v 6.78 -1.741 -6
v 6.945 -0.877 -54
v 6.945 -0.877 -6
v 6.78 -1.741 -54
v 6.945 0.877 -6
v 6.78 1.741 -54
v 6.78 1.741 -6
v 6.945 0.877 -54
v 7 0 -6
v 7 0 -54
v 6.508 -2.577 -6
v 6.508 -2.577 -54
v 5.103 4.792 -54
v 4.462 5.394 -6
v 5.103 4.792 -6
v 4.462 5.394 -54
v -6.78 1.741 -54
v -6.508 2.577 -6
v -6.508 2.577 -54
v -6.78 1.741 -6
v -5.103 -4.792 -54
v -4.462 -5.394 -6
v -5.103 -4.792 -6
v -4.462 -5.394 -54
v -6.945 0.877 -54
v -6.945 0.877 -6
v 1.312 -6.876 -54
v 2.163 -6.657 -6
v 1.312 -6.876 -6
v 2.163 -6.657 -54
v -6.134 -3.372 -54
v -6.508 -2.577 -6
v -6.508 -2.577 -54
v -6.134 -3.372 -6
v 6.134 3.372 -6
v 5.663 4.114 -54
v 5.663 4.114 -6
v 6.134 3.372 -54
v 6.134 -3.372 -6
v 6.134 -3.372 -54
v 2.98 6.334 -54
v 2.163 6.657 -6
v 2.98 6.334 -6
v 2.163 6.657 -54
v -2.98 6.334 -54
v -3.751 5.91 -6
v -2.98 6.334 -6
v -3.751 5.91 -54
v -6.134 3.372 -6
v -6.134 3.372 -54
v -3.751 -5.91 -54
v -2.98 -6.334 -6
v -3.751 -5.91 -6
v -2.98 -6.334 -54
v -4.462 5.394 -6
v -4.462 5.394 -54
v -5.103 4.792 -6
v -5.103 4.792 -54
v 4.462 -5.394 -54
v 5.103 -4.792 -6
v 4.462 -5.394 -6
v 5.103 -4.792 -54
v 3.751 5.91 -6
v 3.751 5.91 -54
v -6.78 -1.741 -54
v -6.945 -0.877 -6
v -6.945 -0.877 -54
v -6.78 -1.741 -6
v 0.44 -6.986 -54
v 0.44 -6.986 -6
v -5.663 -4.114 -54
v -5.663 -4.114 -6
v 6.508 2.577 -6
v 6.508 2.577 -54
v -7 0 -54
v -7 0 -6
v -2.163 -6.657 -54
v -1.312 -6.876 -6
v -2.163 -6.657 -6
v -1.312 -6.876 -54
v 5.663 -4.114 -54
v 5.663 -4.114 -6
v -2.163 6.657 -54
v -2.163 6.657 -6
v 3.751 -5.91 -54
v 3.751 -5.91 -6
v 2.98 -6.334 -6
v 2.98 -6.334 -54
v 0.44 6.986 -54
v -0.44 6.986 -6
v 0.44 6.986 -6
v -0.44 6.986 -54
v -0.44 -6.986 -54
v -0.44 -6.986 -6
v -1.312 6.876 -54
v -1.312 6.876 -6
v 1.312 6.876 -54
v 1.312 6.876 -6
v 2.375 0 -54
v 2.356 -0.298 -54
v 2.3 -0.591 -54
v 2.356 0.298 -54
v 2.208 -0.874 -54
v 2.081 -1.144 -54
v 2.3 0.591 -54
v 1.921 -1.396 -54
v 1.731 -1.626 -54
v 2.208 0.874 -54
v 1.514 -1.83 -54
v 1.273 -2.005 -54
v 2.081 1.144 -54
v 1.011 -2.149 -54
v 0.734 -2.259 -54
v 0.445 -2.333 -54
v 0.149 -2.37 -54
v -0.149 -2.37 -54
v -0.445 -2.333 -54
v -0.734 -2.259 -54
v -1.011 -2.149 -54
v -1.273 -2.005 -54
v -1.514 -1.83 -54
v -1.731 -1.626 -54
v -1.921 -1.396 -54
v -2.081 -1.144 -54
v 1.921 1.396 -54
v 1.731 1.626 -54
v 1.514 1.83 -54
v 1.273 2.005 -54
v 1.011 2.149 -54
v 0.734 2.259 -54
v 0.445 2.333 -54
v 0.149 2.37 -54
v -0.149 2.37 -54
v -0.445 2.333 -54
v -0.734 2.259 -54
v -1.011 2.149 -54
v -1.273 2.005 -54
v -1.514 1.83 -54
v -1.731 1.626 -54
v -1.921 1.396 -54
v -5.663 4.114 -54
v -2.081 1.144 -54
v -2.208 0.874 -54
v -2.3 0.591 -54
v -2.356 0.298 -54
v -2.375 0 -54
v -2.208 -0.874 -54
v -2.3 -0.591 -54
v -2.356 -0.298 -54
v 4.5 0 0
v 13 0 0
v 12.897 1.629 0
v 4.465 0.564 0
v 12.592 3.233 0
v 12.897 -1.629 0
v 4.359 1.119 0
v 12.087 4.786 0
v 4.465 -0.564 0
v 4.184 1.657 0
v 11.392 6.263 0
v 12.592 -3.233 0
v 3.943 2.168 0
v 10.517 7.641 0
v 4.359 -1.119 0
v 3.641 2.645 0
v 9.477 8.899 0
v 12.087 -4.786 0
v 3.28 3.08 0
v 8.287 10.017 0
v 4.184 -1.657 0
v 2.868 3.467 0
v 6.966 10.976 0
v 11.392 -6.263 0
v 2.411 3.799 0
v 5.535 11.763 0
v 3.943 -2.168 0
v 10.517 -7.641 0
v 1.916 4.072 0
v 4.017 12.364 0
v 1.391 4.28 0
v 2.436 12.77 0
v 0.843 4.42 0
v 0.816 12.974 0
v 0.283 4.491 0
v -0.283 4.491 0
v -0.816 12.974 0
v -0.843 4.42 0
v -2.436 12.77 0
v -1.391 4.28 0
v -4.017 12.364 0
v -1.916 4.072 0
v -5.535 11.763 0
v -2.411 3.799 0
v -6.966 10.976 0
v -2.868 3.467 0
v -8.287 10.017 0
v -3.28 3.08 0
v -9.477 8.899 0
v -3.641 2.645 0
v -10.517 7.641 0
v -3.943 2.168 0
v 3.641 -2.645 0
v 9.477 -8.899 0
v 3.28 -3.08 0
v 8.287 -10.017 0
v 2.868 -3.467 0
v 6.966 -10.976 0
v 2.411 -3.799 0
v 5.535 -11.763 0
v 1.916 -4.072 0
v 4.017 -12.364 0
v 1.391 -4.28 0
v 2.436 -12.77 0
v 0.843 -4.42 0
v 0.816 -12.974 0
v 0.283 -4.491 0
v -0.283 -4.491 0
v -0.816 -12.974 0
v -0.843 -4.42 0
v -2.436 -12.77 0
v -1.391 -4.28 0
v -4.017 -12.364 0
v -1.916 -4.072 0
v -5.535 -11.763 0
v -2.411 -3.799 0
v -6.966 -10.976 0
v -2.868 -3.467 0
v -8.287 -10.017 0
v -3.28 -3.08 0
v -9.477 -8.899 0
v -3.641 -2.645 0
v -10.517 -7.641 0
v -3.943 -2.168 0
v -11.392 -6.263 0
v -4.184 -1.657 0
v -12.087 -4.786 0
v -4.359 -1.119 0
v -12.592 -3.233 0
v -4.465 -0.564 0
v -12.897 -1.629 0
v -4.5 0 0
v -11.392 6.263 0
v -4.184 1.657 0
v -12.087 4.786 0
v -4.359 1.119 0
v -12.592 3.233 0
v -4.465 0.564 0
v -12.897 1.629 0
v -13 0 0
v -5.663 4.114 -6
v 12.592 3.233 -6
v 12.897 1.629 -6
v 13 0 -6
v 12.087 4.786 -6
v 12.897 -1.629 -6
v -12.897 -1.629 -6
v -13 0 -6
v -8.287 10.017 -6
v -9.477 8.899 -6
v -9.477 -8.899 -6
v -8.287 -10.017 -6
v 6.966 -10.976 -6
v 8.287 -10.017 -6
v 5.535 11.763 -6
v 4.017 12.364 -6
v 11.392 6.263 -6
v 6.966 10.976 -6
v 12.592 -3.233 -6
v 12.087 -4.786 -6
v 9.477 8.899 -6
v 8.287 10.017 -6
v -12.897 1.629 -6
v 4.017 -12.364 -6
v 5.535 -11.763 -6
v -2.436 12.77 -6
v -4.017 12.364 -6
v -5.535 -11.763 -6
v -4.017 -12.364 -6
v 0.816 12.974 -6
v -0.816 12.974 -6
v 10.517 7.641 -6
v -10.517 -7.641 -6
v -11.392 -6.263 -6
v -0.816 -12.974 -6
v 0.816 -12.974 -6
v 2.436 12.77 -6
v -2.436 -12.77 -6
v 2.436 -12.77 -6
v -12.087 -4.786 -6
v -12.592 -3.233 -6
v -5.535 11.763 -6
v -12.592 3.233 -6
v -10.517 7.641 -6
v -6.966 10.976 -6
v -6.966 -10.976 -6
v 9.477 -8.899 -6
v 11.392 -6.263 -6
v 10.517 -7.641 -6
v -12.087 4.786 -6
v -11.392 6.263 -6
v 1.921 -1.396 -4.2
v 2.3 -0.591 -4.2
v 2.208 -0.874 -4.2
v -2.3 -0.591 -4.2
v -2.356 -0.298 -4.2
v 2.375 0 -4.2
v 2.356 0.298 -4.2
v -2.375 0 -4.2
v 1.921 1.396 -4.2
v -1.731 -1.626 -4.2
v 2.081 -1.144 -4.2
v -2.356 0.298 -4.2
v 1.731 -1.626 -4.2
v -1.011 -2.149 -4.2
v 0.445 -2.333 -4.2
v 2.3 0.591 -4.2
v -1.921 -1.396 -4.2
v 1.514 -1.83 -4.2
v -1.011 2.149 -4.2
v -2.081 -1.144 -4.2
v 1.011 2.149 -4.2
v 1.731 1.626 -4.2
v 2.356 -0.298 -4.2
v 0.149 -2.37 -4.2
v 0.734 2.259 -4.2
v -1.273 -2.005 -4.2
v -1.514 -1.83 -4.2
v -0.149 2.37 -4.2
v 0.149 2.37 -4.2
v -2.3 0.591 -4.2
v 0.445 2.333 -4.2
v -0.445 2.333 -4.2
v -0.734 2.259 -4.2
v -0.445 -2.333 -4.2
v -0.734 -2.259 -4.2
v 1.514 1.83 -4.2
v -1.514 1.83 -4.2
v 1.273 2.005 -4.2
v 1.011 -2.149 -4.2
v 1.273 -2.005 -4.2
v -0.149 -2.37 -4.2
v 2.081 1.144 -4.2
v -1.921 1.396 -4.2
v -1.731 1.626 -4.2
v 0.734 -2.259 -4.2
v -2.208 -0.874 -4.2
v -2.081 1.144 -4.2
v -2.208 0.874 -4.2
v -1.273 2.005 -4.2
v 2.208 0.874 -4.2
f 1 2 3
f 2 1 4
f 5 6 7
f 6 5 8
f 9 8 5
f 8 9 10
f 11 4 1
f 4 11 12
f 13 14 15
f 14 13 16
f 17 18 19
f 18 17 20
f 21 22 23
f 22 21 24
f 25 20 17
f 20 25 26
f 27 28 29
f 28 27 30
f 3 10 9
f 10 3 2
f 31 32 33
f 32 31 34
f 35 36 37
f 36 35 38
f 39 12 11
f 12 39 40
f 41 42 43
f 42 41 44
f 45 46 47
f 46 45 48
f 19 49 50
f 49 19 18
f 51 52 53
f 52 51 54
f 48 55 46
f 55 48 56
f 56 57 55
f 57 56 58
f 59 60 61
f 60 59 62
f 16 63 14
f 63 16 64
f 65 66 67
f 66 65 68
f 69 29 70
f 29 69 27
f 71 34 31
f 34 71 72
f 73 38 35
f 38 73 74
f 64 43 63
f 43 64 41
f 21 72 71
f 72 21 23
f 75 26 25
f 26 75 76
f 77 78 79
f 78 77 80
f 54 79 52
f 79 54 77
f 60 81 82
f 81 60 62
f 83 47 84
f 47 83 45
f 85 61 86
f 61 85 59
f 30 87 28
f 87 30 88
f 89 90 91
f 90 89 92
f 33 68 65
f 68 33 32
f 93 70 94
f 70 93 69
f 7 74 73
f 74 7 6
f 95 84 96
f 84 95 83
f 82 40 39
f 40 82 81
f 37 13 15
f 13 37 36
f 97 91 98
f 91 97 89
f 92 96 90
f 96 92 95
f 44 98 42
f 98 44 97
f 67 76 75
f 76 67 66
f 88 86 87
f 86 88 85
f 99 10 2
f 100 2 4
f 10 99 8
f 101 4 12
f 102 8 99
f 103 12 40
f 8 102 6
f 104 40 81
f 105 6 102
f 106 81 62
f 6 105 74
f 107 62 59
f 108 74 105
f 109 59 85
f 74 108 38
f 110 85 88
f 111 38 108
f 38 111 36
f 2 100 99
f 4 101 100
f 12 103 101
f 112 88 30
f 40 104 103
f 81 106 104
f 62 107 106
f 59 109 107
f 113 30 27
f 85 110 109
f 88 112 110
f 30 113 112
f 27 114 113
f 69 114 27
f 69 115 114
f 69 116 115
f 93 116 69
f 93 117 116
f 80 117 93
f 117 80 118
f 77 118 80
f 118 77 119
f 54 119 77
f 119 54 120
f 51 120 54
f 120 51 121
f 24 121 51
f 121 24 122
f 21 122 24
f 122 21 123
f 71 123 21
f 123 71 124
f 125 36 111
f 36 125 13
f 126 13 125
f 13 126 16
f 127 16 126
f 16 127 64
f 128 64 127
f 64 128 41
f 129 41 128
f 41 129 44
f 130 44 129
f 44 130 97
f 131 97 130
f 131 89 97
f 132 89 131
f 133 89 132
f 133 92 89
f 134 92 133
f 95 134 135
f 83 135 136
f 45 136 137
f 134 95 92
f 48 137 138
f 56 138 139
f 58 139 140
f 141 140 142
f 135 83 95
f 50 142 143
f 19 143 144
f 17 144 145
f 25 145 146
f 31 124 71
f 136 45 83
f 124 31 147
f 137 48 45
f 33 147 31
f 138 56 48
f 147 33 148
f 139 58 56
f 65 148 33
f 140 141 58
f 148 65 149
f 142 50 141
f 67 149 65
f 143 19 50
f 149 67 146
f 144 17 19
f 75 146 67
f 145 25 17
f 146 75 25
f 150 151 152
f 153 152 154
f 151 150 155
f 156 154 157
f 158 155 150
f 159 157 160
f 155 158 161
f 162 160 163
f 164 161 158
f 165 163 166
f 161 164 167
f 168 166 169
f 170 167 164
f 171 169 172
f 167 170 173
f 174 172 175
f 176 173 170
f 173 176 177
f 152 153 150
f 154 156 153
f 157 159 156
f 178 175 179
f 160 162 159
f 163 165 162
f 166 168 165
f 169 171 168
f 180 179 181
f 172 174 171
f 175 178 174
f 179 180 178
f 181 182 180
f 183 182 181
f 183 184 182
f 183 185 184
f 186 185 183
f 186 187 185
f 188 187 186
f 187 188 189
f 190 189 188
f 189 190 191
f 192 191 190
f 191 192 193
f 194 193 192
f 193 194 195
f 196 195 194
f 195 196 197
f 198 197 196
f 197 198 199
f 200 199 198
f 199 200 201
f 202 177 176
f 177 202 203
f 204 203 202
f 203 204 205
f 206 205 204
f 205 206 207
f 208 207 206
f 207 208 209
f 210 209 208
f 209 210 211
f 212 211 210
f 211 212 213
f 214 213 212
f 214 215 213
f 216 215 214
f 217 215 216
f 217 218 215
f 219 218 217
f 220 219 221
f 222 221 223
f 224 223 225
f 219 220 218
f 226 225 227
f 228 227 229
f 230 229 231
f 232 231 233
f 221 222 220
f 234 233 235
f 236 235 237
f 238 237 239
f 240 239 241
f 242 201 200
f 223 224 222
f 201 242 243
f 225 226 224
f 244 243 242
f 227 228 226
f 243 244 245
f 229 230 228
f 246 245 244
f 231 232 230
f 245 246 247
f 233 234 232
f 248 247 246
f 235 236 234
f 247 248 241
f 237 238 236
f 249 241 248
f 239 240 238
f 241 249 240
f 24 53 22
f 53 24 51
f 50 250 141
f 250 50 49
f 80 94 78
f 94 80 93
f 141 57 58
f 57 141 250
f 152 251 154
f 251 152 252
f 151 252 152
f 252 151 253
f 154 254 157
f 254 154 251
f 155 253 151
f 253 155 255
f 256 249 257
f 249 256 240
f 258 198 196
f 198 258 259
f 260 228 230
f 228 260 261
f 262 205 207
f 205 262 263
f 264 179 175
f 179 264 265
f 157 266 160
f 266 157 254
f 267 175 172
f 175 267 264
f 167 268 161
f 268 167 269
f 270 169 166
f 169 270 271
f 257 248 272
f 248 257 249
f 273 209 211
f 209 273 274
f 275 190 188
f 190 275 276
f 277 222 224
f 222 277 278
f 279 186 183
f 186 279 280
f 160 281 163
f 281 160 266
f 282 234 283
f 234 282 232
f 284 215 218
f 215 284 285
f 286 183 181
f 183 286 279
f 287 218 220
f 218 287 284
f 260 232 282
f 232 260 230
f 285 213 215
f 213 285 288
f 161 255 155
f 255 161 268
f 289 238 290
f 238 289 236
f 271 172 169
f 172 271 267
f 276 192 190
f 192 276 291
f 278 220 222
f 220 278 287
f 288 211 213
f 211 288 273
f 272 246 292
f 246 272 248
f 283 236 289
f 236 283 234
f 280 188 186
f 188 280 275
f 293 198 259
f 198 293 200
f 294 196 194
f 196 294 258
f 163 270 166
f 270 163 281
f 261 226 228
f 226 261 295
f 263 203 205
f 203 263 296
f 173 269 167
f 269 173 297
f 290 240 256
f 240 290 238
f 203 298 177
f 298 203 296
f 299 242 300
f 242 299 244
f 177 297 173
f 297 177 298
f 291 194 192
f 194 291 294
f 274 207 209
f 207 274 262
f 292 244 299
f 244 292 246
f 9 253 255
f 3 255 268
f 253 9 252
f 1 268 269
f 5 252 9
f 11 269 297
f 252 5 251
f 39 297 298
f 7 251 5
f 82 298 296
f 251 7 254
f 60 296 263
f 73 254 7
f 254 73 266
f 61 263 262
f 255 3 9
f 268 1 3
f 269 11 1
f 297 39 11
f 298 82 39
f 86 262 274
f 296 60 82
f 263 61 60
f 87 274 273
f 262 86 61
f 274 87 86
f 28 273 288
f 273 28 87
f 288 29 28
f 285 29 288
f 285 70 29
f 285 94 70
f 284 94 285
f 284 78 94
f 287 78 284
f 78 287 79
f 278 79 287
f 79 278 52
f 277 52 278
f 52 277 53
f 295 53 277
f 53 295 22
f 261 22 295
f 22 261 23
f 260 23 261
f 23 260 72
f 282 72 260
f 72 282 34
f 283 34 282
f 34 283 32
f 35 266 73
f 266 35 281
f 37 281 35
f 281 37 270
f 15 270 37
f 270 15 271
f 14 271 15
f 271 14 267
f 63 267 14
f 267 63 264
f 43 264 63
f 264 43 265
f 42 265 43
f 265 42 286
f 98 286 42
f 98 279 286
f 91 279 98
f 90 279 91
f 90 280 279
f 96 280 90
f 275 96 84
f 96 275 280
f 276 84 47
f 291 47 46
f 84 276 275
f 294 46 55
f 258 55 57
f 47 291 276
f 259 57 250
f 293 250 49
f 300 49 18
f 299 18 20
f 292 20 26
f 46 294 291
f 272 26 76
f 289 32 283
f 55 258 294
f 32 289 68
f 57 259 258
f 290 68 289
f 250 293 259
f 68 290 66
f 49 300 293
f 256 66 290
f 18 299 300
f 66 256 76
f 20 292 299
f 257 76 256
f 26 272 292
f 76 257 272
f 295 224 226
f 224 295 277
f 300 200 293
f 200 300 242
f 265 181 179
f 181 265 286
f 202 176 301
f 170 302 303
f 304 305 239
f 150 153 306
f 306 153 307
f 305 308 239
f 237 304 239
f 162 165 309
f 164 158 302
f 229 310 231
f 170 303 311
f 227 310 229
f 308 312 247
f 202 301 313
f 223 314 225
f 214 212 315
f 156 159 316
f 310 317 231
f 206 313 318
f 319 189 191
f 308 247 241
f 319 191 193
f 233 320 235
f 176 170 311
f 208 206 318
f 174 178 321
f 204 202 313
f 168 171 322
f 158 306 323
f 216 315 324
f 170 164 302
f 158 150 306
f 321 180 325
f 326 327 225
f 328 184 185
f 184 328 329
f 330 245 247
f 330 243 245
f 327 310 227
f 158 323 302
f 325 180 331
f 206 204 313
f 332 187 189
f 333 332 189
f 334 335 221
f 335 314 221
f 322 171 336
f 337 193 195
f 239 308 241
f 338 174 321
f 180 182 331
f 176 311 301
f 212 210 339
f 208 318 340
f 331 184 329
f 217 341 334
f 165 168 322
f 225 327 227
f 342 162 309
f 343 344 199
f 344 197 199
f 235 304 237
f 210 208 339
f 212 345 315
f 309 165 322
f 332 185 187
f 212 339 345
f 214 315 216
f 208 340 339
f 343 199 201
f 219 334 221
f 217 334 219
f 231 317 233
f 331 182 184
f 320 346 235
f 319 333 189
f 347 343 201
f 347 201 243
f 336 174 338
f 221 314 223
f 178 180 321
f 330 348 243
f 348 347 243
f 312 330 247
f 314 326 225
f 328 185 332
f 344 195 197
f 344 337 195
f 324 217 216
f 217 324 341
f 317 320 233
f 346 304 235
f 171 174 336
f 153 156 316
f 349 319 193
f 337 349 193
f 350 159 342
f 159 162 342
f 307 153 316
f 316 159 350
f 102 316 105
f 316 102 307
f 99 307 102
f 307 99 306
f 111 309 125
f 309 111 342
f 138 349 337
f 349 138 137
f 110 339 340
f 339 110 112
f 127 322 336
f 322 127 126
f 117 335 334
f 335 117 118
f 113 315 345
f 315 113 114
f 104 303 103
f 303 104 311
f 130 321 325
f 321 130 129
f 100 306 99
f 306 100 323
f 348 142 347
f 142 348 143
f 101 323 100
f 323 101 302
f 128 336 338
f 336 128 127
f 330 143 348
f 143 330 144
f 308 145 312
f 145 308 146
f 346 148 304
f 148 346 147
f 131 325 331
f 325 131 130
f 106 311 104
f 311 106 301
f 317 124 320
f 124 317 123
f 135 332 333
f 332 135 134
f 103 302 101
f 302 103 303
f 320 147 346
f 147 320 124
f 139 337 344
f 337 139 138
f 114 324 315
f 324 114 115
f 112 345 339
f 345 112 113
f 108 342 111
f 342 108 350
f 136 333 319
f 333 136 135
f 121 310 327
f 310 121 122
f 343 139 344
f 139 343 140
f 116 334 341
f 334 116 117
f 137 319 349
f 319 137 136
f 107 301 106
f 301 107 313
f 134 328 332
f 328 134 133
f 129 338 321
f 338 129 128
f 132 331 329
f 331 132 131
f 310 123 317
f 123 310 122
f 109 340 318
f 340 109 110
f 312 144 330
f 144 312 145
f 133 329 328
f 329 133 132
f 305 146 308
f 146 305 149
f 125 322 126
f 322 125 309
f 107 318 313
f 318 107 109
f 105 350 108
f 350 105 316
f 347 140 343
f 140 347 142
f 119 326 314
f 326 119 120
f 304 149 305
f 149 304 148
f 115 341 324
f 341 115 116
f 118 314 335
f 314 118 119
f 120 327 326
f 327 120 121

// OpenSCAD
$fn = 50;


difference() {
	union() {
		translate(v = [0, 0, -54.0000000000]) {
			cylinder(h = 54, r = 7.0000000000);
		}
		translate(v = [0, 0, -6.0000000000]) {
			cylinder(h = 6, r = 13.0000000000);
		}
	}
	union() {
		translate(v = [0, 0, 0]) {
			rotate(a = [0, 0, 0]) {
				difference() {
					union() {
						#translate(v = [0, 0, -54.0000000000]) {
							cylinder(h = 54, r = 2.2500000000);
						}
						#translate(v = [0, 0, -4.2000000000]) {
							cylinder(h = 4.2000000000, r = 7.0000000000, r1 = 2.3750000000, r2 = 4.5000000000);
						}
						#translate(v = [0, 0, -54.0000000000]) {
							cylinder(h = 54, r = 2.3750000000);
						}
						#translate(v = [0, 0, -54.0000000000]) {
							cylinder(h = 54, r = 2.2500000000);
						}
					}
					union();
				}
			}
		}
	}
}
